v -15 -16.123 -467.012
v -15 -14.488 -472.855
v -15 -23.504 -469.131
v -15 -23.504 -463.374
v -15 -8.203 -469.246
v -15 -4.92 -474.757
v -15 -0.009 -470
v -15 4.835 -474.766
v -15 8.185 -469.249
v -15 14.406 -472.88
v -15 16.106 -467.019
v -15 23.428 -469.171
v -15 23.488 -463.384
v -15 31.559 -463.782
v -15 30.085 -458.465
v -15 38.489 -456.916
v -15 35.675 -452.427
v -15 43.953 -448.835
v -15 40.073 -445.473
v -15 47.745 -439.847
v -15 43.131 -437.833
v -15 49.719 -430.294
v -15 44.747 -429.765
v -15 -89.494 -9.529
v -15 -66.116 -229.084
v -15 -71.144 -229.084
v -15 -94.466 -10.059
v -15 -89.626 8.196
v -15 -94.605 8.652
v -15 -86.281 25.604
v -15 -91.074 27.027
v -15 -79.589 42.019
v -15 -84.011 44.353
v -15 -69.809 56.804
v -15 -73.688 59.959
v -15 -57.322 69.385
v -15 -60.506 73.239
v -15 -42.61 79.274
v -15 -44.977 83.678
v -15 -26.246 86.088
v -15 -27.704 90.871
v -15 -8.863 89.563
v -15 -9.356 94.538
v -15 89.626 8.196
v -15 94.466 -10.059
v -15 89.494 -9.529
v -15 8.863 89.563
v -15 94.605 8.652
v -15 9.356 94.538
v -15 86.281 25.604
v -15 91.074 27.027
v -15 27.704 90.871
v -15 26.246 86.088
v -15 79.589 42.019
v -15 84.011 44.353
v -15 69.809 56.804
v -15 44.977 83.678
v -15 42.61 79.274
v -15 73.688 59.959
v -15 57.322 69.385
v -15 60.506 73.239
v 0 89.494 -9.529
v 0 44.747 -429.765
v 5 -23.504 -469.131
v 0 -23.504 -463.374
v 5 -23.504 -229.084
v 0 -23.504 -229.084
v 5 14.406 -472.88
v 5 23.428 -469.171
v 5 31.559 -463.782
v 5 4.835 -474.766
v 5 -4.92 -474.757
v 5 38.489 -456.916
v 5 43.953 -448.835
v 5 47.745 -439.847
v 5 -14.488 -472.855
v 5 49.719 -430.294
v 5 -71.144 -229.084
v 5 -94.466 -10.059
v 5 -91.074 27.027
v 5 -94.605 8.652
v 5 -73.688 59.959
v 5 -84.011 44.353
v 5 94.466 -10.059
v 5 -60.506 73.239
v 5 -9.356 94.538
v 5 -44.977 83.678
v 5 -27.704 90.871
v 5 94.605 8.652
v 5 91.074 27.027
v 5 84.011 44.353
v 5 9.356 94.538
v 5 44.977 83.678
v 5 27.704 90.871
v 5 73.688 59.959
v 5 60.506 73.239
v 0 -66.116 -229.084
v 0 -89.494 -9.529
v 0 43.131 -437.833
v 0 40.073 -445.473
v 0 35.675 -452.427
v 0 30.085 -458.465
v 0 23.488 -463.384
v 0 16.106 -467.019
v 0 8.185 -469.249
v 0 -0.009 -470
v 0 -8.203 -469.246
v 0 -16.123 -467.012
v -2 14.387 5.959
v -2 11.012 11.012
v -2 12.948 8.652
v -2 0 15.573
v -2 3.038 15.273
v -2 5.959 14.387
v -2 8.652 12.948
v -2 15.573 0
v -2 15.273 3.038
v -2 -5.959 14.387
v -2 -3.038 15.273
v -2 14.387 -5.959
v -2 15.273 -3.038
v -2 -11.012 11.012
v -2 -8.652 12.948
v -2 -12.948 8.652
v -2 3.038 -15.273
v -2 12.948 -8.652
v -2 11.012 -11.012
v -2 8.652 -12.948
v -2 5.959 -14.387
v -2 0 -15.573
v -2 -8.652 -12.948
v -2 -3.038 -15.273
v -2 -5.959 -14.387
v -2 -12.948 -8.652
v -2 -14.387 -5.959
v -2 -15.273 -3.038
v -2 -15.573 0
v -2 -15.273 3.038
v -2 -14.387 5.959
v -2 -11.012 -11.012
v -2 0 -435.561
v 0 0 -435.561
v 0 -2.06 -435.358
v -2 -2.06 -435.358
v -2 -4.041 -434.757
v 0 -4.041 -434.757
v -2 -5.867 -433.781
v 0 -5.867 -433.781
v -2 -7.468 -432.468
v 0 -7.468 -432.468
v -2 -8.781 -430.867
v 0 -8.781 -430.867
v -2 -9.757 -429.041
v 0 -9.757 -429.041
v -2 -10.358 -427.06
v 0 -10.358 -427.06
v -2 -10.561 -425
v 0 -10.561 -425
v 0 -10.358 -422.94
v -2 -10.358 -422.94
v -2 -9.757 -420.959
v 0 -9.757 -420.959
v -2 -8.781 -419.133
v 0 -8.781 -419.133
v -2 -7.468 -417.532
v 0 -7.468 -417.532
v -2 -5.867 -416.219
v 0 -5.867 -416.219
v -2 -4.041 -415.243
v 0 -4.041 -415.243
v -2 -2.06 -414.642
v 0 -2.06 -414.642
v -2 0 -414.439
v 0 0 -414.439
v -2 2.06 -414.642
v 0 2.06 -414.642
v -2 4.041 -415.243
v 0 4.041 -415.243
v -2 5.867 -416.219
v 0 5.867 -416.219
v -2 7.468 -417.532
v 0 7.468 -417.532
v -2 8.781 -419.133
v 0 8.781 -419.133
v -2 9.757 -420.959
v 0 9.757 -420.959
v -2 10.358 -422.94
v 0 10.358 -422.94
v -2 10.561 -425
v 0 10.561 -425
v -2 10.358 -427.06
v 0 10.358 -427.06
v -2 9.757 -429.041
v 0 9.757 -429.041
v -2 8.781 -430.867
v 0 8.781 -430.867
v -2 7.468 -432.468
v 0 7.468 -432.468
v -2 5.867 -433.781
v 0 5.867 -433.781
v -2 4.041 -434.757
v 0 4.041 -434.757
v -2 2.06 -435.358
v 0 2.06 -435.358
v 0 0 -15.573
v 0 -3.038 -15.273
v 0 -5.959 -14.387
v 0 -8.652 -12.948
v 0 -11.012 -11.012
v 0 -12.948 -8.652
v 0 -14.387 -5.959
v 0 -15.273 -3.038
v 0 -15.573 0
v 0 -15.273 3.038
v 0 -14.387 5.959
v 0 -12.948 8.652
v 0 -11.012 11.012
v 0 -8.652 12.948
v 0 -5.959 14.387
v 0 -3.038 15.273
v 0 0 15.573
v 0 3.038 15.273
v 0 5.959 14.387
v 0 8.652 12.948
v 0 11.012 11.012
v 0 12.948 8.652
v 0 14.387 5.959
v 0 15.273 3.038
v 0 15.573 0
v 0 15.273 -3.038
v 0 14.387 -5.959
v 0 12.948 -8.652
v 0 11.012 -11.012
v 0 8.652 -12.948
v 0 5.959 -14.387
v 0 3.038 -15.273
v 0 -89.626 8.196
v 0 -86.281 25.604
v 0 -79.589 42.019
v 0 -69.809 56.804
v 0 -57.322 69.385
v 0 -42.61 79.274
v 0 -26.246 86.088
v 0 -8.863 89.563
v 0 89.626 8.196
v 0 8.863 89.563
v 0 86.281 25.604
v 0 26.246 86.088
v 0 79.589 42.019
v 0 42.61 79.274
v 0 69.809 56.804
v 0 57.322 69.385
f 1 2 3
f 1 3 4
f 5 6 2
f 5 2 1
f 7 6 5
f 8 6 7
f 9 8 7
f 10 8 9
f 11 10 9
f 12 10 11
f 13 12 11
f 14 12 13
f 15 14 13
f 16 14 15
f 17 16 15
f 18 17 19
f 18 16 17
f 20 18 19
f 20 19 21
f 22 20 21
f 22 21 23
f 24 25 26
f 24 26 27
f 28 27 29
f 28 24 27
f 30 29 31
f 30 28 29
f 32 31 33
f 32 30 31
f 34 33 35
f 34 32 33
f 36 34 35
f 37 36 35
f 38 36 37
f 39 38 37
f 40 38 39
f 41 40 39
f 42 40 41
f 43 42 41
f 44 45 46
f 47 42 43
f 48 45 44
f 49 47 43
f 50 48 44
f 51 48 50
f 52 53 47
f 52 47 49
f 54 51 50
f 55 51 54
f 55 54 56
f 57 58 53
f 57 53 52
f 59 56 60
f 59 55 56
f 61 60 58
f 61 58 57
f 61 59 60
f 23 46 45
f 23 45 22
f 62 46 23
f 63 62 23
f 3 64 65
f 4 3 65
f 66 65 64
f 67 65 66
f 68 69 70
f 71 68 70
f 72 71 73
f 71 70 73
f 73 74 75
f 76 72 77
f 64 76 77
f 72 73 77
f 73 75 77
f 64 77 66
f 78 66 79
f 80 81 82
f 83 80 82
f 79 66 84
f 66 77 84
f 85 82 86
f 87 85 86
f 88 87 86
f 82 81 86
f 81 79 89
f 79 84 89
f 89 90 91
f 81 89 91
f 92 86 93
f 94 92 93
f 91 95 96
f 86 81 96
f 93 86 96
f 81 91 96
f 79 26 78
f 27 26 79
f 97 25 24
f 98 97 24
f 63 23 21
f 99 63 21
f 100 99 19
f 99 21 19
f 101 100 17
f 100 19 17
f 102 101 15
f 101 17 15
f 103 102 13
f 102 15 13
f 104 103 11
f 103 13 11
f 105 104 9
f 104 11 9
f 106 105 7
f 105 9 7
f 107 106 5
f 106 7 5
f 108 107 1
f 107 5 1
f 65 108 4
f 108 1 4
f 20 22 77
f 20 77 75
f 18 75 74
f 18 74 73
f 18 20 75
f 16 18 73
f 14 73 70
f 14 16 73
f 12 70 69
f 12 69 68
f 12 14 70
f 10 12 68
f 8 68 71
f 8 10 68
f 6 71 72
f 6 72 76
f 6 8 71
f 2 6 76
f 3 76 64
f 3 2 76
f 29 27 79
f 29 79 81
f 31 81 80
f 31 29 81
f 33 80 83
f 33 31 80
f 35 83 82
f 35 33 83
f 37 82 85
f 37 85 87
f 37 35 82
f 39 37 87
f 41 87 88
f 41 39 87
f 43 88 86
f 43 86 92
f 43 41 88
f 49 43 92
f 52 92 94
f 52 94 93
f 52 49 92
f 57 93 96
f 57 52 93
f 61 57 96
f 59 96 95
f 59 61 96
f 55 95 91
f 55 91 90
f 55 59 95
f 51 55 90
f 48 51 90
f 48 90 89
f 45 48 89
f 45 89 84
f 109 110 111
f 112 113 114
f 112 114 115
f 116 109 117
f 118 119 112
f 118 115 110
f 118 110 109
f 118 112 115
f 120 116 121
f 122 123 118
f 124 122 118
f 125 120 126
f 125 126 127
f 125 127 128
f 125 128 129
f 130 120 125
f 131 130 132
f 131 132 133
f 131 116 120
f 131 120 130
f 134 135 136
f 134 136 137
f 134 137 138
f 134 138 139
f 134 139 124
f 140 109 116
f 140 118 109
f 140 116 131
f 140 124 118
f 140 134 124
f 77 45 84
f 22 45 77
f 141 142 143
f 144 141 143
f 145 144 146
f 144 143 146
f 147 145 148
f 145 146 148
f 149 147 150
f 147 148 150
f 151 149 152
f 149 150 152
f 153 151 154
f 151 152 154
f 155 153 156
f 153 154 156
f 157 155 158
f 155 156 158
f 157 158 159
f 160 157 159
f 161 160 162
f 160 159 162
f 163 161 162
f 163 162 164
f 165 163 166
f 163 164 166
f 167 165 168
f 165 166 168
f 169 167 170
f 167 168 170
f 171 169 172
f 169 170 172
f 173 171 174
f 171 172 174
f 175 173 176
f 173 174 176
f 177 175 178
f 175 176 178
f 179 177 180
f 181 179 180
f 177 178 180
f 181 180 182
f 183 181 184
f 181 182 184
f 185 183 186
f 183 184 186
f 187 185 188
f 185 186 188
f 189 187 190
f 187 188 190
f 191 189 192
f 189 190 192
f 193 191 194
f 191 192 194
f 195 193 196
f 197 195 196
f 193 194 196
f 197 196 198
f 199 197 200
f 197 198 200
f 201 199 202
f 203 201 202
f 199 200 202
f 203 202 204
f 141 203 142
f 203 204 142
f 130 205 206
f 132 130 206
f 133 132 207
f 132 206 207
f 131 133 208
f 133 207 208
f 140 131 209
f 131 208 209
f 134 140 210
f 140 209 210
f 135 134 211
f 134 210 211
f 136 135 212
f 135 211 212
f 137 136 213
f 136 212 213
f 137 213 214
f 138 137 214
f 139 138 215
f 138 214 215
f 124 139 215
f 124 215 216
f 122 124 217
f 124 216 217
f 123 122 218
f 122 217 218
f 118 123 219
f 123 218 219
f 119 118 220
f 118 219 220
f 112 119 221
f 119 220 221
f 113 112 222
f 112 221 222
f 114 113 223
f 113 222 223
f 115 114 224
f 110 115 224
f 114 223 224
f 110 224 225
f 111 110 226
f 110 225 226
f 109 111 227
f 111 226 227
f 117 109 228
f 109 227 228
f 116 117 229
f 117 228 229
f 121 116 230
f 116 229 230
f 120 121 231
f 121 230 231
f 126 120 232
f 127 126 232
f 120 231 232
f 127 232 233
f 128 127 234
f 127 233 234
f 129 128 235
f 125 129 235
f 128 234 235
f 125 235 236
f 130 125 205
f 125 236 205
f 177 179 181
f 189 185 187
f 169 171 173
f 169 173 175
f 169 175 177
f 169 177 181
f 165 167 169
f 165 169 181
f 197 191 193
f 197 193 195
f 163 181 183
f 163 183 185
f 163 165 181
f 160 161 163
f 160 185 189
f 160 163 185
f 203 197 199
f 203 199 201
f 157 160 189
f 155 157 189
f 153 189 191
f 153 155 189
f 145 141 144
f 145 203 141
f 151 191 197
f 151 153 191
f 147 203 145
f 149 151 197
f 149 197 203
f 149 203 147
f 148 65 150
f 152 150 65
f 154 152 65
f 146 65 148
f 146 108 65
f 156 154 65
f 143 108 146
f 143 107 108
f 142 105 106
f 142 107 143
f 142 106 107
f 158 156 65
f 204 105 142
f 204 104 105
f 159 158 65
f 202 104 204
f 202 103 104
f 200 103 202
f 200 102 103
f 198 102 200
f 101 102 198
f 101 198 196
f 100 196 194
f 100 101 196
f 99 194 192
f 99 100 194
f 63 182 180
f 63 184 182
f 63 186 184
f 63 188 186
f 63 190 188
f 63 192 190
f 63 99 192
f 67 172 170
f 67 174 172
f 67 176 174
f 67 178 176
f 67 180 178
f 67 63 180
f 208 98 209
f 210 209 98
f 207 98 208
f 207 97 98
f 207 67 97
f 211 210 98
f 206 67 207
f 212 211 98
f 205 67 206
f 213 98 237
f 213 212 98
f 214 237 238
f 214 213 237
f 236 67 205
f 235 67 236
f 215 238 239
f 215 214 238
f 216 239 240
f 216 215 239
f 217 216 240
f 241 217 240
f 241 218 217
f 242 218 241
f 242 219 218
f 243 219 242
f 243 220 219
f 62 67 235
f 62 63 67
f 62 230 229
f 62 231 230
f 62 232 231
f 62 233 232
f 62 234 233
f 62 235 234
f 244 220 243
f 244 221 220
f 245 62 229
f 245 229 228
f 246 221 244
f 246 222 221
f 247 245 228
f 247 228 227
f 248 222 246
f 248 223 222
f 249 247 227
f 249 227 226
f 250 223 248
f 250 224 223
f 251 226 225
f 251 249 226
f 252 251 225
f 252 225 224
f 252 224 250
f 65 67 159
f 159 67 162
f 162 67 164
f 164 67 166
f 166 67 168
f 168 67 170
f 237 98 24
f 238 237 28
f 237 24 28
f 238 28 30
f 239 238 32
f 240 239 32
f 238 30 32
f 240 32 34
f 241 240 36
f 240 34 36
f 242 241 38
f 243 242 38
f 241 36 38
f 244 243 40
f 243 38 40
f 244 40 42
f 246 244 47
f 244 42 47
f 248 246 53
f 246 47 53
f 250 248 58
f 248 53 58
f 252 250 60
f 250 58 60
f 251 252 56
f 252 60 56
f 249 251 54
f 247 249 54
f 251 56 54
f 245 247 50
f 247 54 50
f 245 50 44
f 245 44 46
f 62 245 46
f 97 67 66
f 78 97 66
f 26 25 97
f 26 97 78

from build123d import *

# Parameters (mm, degrees)
DODANIE_WYCI_GNI_CIE1_DEPTH = 5
DODANIE_WYCI_GNI_CIE2_START = 15
DODANIE_WYCI_GNI_CIE2_DEPTH = 15
SZKIC3_R                    = 10.56077606
SZKIC3_R_2                  = 15.572635527
DODANIE_WYCI_GNI_CIE3_DEPTH = 2
WYTNIJ_WYCI_GNI_CIE1_START  = -20
WYTNIJ_WYCI_GNI_CIE1_DEPTH  = 20


with BuildPart() as part:
    # Szkic1 → Dodanie-wyciągnięcie1 (new body)
    with BuildSketch(Plane(origin=(0, 0, 0), x_dir=(0, 0, -1), z_dir=(1, 0, 0))):
        with BuildLine():
            Line((10.058823529, 94.465973076), (430.294117647, 49.718933198))
            ThreePointArc((430.294117647, 49.718933198), (475, 0), (430.294117647, -49.718933198))
            Line((430.294117647, -49.718933198), (10.058823529, -94.465973076))
            ThreePointArc((10.058823529, -94.465973076), (-95, 0), (10.058823529, 94.465973076))
        make_face()
    extrude(amount=DODANIE_WYCI_GNI_CIE1_DEPTH)

    # Szkic2 → Dodanie-wyciągnięcie2 (add)
    with BuildSketch(Plane.ZY.offset(DODANIE_WYCI_GNI_CIE2_START)):
        with BuildLine():
            Line((-10.058823529, 94.465973076), (-430.294117647, 49.718933198))
            ThreePointArc((-430.294117647, 49.718933198), (-475, 0), (-430.294117647, -49.718933198))
            Line((-430.294117647, -49.718933198), (-10.058823529, -94.465973076))
            ThreePointArc((-10.058823529, -94.465973076), (95, 0), (-10.058823529, 94.465973076))
        make_face()
        with BuildLine():
            Line((-9.529411765, 89.494079756), (-429.764705882, 44.747039878))
            ThreePointArc((-429.764705882, 44.747039878), (-470, 0), (-429.764705882, -44.747039878))
            Line((-429.764705882, -44.747039878), (-9.529411765, -89.494079756))
            ThreePointArc((-9.529411765, -89.494079756), (90, 0), (-9.529411765, 89.494079756))
        make_face(mode=Mode.SUBTRACT)
    extrude(amount=-DODANIE_WYCI_GNI_CIE2_DEPTH)

    # Szkic3 → Dodanie-wyciągnięcie3 (add)
    with BuildSketch(Plane.ZY):
        with Locations((-425, 0)):
            Circle(SZKIC3_R)
        Circle(SZKIC3_R_2)
    extrude(amount=DODANIE_WYCI_GNI_CIE3_DEPTH)

    # Szkic4 → Wytnij-wyciągnięcie1 (cut)
    with BuildSketch(Plane(origin=(5, 0, 0), x_dir=(0, 0, -1), z_dir=(1, 0, 0)).offset(WYTNIJ_WYCI_GNI_CIE1_START)):
        with BuildLine():
            ThreePointArc((430.294117647, -49.718933198), (452.973624228, -41.442446206), (469.131245302, -23.503897297))
            Line((469.131245302, -23.503897297), (229.084460246, -23.503897297))
            Line((229.084460246, -23.503897297), (229.084460246, -71.143922221))
            Line((229.084460246, -71.143922221), (430.294117647, -49.718933198))
        make_face()
    extrude(amount=WYTNIJ_WYCI_GNI_CIE1_DEPTH, mode=Mode.SUBTRACT)


solid = part.part
